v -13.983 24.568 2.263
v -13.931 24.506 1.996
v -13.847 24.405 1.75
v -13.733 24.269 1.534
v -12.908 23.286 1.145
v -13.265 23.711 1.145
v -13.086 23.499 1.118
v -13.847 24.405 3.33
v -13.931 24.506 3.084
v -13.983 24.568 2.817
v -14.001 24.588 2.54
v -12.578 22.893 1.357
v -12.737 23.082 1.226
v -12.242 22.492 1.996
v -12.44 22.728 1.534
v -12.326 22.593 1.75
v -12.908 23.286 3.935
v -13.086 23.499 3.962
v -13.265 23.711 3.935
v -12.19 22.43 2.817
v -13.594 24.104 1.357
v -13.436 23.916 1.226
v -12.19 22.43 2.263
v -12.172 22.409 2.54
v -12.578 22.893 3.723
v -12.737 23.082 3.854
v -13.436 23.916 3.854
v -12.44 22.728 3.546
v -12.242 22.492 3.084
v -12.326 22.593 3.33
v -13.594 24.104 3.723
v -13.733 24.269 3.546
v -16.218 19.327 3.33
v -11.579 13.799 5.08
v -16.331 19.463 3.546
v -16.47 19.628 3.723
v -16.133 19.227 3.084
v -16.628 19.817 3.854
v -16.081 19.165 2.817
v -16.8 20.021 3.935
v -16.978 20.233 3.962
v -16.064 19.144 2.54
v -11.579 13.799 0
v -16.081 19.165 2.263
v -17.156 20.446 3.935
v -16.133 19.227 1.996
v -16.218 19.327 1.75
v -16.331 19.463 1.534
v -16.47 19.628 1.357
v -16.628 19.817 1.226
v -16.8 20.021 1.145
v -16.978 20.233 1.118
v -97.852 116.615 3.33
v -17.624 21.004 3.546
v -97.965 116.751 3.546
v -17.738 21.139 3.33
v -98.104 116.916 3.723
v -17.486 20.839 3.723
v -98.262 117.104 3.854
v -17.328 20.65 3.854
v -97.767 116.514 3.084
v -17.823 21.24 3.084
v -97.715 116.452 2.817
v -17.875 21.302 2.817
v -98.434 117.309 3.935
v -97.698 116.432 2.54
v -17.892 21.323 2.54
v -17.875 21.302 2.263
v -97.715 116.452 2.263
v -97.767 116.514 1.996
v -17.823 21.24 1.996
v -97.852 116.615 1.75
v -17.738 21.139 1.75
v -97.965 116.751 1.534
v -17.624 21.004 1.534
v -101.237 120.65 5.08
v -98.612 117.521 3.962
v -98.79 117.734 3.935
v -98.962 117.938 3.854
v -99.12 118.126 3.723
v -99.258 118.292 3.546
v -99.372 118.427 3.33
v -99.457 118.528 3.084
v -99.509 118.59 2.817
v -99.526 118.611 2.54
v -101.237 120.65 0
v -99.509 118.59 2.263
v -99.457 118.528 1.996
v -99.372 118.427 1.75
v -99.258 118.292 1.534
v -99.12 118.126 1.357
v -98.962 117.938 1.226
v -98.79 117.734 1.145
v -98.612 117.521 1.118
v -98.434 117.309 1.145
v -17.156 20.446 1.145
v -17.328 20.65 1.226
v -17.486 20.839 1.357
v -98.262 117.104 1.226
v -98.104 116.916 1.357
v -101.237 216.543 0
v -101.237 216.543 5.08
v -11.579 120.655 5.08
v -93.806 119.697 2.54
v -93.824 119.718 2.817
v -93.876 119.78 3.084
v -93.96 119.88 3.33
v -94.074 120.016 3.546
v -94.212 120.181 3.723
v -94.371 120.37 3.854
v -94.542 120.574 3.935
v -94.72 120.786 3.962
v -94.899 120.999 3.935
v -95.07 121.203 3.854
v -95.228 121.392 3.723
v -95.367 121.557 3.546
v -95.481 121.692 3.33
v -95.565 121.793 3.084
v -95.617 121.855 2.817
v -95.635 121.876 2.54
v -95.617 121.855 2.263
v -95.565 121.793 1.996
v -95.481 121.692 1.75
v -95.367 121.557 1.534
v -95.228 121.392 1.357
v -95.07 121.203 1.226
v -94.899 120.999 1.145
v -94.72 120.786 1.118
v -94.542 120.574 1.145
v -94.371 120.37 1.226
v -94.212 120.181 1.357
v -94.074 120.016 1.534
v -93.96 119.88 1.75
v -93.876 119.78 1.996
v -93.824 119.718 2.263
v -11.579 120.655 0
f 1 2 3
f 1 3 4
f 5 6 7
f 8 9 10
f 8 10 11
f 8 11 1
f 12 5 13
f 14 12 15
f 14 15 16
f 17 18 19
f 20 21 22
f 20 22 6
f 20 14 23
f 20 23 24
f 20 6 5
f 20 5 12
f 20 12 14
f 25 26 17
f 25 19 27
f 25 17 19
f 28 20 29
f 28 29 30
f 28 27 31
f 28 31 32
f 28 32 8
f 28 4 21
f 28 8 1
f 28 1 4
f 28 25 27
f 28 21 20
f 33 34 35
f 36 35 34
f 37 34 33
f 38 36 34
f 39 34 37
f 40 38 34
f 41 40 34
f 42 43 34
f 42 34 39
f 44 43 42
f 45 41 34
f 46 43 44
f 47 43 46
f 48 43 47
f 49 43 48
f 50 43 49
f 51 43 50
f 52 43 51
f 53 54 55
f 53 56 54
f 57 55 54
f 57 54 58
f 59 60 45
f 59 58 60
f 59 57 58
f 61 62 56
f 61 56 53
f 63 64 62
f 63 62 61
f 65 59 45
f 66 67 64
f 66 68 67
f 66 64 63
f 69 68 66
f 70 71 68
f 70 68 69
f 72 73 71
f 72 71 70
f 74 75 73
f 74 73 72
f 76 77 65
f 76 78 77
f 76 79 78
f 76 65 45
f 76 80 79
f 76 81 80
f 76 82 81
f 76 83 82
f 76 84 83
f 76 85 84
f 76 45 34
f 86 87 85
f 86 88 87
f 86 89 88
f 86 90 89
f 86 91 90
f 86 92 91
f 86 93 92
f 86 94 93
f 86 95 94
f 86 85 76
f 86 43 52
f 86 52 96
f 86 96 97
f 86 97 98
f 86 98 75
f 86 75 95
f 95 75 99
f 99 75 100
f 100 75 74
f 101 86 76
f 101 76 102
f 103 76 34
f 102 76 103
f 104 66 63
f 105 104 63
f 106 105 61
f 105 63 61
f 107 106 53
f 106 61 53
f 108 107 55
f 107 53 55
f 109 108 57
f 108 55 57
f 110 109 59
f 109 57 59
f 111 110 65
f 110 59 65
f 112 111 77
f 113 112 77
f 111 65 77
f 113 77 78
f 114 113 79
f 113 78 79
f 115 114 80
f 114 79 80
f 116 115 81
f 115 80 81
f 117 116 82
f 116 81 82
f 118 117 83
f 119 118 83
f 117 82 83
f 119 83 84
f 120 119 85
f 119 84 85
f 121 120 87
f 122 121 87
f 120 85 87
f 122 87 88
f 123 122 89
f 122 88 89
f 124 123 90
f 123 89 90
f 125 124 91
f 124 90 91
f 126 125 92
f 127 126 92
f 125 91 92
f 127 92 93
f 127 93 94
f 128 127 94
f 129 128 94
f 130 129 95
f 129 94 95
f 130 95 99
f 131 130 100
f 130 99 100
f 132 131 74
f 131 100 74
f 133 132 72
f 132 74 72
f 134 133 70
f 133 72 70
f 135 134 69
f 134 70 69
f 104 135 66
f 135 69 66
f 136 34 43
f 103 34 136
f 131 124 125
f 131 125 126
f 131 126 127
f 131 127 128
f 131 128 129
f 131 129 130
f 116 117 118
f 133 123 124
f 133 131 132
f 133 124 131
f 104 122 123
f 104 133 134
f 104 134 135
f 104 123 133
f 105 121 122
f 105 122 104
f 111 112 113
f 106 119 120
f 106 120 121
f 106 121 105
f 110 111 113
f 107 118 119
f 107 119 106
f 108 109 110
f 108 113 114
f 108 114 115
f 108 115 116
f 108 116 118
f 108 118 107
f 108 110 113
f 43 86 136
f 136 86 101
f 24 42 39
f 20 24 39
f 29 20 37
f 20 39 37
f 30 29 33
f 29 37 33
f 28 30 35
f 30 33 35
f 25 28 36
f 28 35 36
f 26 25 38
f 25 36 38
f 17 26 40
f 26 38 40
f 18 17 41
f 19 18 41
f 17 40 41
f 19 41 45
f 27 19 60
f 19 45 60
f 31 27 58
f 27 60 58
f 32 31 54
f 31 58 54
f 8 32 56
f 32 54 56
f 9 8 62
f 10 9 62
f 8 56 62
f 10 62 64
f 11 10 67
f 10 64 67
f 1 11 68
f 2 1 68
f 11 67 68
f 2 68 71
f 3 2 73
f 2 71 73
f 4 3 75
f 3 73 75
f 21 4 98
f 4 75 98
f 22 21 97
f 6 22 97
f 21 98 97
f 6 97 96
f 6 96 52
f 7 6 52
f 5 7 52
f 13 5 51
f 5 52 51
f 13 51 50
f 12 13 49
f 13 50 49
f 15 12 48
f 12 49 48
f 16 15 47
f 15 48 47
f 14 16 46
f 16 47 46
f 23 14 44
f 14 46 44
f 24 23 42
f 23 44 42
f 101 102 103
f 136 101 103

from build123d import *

# Parameters (mm, degrees)
SKETCH1_W           = 101.237370502
SKETCH1_H           = 95.893480298
BOSS_EXTRUDE1_DEPTH = 5.08
CUT_EXTRUDE1_DEPTH  = 50.8
SKETCH3_W           = 34.377834067
SKETCH3_H           = 141.590062345
CUT_EXTRUDE2_DEPTH  = 25.4
SKETCH4_R           = 1.4224
CUT_EXTRUDE3_DEPTH  = 5.08


with BuildPart() as part:
    # Sketch1 → Boss-Extrude1 (new body)
    with BuildSketch(Plane.XY):
        with Locations((-50.618685251, 168.596740149)):
            Rectangle(SKETCH1_W, SKETCH1_H)
        Polygon((-101.237370502, 120.65), (0, 120.65), (0, 0), align=None)
    extrude(amount=BOSS_EXTRUDE1_DEPTH)

    # Sketch2 → Cut-Extrude1 (cut)
    with BuildSketch(Plane.XY.offset(5.08)):
        Polygon((-101.237370502, 216.543480298), (0, 108.271740149), (0, 216.543480298), align=None)
    extrude(amount=-CUT_EXTRUDE1_DEPTH, mode=Mode.SUBTRACT)

    # Sketch3 → Cut-Extrude2 (cut)
    with BuildSketch(Plane.XY.offset(5.08)):
        with Locations((5.61014441, 62.39317364)):
            Rectangle(SKETCH3_W, SKETCH3_H)
    extrude(amount=-CUT_EXTRUDE2_DEPTH, mode=Mode.SUBTRACT)

    # Sketch4 → Cut-Extrude3 (cut)
    with BuildSketch(Plane(origin=(0, 0, 0), x_dir=(0, 0, 1), z_dir=(-0.7660444431189743, -0.6427876096865437, 0))):
        with Locations(Location((2.54, 26.412934343, 0), (0, 0, 270))):
            Circle(SKETCH4_R)
        with Locations(Location((2.54, 153.412934343, 0), (0, 0, 270))):
            Circle(SKETCH4_R)
    extrude(amount=-CUT_EXTRUDE3_DEPTH, mode=Mode.SUBTRACT)


solid = part.part
